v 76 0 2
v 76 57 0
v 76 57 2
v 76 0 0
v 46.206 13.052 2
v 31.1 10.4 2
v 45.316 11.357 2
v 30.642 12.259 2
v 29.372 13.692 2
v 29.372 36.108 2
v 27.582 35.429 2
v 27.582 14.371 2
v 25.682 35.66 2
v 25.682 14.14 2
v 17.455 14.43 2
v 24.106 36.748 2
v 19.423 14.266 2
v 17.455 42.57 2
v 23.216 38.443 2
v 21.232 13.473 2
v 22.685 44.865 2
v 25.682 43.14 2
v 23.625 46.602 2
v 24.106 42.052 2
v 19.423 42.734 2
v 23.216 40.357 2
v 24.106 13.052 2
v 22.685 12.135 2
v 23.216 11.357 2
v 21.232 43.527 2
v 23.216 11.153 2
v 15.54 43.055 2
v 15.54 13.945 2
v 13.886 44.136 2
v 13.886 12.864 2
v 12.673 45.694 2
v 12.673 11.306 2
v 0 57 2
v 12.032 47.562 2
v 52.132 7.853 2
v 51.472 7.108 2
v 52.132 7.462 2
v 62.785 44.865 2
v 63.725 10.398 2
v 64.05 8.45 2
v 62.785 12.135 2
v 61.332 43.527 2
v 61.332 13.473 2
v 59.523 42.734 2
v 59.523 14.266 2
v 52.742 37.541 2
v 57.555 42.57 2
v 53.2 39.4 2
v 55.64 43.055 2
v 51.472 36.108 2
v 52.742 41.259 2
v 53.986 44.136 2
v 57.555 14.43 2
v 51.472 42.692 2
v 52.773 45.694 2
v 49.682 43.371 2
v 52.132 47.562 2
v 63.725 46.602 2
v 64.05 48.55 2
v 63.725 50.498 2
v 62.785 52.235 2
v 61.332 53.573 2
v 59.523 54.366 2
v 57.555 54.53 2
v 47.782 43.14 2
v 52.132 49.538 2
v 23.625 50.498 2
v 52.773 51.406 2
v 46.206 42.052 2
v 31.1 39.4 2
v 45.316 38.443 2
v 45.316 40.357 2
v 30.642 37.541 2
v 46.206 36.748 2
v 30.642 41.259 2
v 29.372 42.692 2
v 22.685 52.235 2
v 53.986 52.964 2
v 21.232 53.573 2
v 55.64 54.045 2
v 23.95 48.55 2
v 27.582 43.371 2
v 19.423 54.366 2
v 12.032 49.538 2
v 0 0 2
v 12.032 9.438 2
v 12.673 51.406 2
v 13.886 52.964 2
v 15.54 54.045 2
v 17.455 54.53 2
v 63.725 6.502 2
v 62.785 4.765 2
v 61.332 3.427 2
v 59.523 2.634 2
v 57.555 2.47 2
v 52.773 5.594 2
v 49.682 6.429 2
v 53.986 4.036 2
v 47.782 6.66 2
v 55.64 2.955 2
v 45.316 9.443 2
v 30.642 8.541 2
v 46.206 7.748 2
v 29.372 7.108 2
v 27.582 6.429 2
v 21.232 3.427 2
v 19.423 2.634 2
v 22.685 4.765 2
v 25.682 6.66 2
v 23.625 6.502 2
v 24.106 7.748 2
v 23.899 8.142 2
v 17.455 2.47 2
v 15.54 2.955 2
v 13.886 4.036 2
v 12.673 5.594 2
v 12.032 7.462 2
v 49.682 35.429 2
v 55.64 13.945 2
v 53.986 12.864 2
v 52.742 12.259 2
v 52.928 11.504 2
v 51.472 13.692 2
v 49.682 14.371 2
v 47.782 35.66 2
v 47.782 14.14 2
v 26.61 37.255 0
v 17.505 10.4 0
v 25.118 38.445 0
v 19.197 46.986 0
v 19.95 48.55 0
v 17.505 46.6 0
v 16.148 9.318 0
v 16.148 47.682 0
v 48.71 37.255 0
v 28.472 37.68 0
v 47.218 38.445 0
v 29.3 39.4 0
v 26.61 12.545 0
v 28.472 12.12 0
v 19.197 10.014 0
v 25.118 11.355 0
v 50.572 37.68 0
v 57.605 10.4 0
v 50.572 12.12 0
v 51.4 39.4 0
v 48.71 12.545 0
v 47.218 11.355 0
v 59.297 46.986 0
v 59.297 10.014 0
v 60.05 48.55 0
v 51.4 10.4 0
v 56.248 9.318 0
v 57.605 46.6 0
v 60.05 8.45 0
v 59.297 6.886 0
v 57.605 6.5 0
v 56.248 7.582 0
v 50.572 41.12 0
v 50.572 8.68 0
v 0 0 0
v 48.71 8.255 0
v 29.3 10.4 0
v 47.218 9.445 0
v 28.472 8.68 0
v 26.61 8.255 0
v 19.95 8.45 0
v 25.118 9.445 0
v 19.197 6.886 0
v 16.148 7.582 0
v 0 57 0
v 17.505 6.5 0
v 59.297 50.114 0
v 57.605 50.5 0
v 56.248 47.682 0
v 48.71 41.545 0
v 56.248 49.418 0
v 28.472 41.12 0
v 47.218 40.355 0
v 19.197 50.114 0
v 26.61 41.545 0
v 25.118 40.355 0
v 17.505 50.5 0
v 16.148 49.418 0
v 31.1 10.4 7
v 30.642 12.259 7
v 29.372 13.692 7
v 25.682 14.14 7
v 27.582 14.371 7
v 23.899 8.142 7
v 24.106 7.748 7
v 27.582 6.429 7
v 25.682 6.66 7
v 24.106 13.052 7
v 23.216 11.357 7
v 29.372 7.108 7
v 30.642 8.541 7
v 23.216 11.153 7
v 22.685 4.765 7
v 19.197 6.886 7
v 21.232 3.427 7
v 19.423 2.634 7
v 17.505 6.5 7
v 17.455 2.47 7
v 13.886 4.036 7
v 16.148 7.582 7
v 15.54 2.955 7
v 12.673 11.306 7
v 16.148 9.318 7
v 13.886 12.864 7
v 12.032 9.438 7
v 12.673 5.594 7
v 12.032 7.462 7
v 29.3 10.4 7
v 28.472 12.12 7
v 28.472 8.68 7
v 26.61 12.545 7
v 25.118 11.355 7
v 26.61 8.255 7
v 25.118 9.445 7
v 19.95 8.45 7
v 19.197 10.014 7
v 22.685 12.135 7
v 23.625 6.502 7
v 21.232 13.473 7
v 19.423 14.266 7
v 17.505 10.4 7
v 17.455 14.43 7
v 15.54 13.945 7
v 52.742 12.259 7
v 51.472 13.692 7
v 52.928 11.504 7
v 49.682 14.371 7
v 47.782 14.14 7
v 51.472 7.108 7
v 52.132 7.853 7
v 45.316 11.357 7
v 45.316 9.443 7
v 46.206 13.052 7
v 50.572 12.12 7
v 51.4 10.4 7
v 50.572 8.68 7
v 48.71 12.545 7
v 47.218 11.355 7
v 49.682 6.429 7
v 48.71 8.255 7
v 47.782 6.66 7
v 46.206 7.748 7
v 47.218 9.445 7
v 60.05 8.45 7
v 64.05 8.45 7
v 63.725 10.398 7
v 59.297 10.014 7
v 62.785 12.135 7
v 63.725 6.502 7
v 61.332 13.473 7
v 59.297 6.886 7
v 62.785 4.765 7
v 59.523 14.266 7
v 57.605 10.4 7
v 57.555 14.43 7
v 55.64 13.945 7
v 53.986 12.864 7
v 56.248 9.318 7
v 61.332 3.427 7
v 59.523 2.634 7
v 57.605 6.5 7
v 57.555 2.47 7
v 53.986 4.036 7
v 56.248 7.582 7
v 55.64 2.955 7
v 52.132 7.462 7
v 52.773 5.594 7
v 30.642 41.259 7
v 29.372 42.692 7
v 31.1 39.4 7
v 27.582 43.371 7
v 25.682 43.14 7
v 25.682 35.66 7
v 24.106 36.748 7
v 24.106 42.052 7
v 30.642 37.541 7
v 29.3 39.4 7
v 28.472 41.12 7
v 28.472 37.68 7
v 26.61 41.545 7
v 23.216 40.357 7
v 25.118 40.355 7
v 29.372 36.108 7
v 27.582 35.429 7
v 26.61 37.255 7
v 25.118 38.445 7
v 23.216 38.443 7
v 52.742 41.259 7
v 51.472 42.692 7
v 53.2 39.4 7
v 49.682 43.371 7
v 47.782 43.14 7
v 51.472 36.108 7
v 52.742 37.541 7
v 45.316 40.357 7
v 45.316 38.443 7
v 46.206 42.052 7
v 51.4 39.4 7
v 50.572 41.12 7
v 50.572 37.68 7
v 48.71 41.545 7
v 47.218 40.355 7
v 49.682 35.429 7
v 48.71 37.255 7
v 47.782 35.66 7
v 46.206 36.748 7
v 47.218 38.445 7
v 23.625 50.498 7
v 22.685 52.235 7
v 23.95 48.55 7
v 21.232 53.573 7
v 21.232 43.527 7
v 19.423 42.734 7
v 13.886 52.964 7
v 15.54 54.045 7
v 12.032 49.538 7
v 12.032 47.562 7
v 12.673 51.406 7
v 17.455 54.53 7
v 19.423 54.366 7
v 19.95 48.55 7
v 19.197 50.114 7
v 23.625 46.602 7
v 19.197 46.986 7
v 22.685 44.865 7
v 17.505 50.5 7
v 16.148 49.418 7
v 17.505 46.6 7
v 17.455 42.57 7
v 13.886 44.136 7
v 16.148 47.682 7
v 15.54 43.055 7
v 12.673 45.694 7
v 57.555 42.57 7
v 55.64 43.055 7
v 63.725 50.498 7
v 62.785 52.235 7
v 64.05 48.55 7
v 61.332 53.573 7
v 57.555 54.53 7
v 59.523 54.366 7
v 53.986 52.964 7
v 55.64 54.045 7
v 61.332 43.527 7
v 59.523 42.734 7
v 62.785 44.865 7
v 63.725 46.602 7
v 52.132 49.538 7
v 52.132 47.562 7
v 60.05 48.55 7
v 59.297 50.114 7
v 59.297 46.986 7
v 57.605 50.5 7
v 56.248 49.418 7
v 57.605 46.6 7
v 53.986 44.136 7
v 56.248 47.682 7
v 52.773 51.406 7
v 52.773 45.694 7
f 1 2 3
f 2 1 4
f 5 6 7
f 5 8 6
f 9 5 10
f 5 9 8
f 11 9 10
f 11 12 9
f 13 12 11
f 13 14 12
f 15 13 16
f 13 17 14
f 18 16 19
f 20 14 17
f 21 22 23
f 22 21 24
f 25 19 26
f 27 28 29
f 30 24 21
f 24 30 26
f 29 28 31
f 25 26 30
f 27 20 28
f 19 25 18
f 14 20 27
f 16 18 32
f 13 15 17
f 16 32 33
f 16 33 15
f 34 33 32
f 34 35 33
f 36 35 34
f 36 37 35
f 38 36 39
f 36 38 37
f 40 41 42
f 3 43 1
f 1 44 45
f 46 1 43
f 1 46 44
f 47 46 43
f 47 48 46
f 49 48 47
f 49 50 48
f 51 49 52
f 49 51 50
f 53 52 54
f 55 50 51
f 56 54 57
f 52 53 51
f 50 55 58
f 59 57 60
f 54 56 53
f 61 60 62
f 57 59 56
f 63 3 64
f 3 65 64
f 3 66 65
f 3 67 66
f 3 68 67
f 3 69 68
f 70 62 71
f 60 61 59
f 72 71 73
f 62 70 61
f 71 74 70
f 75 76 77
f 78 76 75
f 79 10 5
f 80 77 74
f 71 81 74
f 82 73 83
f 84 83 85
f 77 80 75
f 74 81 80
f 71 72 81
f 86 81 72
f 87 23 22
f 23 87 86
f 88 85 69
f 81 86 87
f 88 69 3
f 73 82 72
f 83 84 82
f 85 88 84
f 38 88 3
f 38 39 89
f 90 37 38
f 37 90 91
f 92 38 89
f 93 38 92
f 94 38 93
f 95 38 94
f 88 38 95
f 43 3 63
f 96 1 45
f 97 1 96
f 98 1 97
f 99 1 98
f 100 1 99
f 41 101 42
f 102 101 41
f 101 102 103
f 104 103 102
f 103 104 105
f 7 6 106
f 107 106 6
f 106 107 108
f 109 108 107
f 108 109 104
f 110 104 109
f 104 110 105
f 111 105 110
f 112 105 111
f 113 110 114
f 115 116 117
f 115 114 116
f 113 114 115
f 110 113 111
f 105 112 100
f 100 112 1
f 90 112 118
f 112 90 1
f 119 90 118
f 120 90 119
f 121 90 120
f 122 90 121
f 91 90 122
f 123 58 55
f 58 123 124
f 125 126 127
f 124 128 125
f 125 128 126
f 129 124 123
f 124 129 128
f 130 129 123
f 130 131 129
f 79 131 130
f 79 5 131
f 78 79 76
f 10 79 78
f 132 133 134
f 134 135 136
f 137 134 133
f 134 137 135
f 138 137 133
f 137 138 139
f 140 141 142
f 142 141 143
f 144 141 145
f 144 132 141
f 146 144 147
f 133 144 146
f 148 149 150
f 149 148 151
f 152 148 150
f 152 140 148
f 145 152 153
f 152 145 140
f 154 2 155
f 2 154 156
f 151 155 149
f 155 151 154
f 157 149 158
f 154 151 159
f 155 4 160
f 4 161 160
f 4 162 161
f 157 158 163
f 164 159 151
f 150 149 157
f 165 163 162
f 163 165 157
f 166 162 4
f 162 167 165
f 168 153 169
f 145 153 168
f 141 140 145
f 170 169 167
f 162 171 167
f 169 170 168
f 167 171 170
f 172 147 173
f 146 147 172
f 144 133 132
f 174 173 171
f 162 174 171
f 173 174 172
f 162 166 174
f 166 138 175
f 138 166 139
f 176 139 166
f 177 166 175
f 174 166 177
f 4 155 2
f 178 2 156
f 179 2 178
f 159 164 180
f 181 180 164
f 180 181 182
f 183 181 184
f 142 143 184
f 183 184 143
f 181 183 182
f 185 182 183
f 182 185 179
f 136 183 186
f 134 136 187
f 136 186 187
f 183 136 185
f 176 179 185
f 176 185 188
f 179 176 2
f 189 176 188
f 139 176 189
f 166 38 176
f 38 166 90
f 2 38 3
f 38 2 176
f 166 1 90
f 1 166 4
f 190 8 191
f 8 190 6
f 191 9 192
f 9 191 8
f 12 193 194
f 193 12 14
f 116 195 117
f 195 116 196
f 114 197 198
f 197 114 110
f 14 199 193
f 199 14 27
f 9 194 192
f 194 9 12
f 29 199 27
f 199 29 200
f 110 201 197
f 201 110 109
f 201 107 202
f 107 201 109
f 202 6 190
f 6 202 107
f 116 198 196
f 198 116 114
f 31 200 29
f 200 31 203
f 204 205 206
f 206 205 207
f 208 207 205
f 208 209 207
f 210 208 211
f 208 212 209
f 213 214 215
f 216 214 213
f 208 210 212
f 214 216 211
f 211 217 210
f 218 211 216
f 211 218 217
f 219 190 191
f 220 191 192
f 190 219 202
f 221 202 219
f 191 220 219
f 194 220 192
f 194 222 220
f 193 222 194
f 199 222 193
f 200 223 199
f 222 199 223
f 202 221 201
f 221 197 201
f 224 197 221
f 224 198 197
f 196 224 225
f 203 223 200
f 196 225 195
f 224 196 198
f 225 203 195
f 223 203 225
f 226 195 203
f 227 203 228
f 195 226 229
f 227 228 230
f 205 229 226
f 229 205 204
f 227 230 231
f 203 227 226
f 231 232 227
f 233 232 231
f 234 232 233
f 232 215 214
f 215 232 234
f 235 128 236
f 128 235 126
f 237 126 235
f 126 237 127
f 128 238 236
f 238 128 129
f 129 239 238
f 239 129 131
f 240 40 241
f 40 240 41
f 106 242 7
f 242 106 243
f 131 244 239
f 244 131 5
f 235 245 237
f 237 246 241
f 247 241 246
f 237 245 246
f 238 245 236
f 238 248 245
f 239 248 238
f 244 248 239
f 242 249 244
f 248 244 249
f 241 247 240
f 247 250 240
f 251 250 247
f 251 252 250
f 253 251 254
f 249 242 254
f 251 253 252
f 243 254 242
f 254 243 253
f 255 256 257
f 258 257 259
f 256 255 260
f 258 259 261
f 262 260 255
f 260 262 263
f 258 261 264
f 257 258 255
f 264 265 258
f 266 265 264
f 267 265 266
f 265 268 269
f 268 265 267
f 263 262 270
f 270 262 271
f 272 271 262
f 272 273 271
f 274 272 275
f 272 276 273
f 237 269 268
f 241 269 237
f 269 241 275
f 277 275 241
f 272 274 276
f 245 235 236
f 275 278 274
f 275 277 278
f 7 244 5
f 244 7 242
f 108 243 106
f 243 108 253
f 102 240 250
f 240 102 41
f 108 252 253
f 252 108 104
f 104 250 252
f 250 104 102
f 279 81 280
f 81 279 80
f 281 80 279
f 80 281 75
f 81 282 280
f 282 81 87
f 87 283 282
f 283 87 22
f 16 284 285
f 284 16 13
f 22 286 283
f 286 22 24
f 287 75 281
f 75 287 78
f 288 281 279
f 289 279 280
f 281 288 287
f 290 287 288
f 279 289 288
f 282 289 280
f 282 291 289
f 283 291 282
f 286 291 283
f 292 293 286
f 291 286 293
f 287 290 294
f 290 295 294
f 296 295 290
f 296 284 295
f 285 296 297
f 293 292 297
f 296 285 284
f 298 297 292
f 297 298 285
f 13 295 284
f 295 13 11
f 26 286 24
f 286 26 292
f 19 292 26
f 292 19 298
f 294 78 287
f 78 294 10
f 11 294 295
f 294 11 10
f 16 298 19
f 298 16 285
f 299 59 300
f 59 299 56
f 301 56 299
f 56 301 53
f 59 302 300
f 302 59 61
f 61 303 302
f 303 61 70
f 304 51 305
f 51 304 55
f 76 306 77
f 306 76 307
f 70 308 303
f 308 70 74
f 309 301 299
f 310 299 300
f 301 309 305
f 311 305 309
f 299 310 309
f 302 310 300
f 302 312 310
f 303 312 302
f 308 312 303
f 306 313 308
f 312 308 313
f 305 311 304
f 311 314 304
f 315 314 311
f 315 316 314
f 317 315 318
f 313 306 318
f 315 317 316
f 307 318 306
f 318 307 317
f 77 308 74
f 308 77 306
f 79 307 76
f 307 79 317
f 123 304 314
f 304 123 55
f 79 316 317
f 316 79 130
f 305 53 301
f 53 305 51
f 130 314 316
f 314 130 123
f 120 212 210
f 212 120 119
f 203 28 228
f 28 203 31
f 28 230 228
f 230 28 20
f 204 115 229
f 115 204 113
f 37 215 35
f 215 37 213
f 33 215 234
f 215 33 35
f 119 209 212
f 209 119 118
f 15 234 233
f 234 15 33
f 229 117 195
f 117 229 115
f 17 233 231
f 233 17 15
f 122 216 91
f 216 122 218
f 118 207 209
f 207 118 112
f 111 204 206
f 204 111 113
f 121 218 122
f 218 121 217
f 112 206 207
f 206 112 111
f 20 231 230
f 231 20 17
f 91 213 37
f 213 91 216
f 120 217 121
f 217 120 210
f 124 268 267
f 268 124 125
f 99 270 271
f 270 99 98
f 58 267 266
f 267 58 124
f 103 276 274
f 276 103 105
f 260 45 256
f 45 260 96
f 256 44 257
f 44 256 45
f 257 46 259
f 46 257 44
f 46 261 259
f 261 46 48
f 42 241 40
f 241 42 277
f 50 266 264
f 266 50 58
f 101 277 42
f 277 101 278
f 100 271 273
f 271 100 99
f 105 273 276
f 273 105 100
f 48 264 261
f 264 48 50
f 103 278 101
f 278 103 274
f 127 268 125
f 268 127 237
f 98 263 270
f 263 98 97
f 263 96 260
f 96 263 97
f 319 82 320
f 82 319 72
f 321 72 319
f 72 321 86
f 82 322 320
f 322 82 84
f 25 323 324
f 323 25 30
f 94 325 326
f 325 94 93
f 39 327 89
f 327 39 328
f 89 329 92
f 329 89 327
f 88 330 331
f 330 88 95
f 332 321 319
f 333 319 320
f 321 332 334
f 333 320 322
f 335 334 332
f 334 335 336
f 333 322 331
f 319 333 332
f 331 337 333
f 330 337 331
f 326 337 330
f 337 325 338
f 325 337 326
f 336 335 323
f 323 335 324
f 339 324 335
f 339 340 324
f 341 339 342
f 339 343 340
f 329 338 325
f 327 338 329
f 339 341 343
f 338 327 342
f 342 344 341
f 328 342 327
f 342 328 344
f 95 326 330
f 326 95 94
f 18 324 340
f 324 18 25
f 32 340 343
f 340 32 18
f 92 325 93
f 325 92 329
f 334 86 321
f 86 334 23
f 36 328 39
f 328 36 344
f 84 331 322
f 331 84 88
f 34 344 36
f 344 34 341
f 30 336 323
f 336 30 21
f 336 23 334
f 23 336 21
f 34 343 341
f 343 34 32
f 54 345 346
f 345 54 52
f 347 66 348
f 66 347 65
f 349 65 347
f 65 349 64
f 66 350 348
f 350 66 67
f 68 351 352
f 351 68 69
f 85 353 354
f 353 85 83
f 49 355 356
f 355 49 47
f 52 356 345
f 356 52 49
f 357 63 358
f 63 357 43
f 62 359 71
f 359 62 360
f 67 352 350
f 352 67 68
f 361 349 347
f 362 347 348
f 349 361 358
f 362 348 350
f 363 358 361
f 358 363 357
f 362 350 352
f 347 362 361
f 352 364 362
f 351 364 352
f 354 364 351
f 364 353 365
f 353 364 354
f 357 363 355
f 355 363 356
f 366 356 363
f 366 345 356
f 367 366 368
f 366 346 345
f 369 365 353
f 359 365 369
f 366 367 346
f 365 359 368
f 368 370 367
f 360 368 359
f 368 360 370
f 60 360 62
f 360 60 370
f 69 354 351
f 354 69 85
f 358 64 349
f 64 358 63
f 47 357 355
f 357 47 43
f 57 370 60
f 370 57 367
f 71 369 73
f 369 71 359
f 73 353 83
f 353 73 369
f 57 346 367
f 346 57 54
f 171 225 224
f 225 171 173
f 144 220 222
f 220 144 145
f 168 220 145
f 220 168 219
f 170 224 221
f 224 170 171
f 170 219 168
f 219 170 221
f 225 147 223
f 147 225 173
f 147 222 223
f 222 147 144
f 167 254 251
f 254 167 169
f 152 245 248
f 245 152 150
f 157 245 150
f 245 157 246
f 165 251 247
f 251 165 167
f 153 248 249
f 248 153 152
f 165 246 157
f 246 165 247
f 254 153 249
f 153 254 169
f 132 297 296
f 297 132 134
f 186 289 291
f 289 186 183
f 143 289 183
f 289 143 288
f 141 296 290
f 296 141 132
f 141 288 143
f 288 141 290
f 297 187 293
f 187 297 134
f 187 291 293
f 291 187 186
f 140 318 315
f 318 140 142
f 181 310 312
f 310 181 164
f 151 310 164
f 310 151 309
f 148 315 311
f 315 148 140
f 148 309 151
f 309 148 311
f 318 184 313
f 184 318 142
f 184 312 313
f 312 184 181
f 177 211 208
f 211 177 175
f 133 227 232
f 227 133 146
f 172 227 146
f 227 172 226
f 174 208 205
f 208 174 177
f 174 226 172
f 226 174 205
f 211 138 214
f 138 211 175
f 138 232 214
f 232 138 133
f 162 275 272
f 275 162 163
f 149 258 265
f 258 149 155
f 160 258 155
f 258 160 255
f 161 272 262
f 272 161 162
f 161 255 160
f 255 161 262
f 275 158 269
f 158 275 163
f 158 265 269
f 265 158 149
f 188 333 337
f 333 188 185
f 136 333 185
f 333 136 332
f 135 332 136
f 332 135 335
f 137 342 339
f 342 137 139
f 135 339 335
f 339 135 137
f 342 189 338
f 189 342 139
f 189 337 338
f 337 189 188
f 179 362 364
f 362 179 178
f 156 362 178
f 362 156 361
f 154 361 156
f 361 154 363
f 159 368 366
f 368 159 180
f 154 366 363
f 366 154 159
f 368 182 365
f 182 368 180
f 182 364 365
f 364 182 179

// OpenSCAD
// Plate
plateX = 76;
plateY = 57;
plateZThickness = 2;

plateXZero = 38;
plateYZero = 28.5;


//RoboPhilo mount variables
//Screw Hole size is to allow screws to pass through without biting
rpScrewHoleSize = 2.2;

rpXLeft = 26 + rpScrewHoleSize/2;
rpXRight = 48.1 + rpScrewHoleSize/2;
rpXMidSpace = 20;

rpYBottom = 9.3 + rpScrewHoleSize/2;
rpYTop = 38.3 + rpScrewHoleSize/2;
rpYMidSpace = 27;

//ezRobot mount variables
//Screw hole size here is to allow #4 screws to bite into it
//You can change the screwhole size and the hole will stay in the same position
ezrScrewHoleSize = 2;
ezrOffset = 17.5 + 2.55; //2.55 is the center of the hole on teh ezbv4

difference(){
union(){
// Plate
cube([plateX,plateY,plateZThickness]);

//RoboPhilo screw mounts
//fixed position based on the actual plate
//lower left
color([1,0,0])
translate([rpXLeft,rpYBottom,plateZThickness])
cylinder(5,4,4);

//lower right
color([1,0,0])
translate([rpXRight,rpYBottom,plateZThickness])
cylinder(5,4,4);

//upper left
color([1,0,0])
translate([rpXLeft,rpYTop,plateZThickness])
cylinder(5,4,4);

//upper right
color([1,0,0])
translate([rpXRight,rpYTop,plateZThickness])
cylinder(5,4,4);

//EZ Robot Screw mounts
//calculated based on the center coordinates of the plate
//lower left
color([0,1,0])
translate([plateXZero-ezrOffset,plateYZero-ezrOffset,plateZThickness])
cylinder(5,6,6);

//lower right
color([0,1,0])
translate([plateXZero+ezrOffset,plateYZero-ezrOffset,plateZThickness])
cylinder(5,6,6);

//upper left
color([0,1,0])
translate([plateXZero-ezrOffset,plateYZero+ezrOffset,plateZThickness])
cylinder(5,6,6);

//upper right
color([0,1,0])
translate([plateXZero+ezrOffset,plateYZero+ezrOffset,plateZThickness])
cylinder(5,6,6);

} //end union() of plate



//mount holes to mount to RoboPhilo
//lower left
color([0,0,1])
translate([rpXLeft,rpYBottom,-1])
cylinder(10,rpScrewHoleSize,rpScrewHoleSize);

//lower right
color([0,0,1])
translate([rpXRight,rpYBottom,-1])
cylinder(10,rpScrewHoleSize,rpScrewHoleSize);

//upper left
color([0,0,1])
translate([rpXLeft,rpYTop,-1])
cylinder(10,rpScrewHoleSize,rpScrewHoleSize);

//upper right
color([0,0,1])
translate([rpXRight,rpYTop,-1])
cylinder(10,rpScrewHoleSize,rpScrewHoleSize);

//EZ Robot Screw holes
//lower left
color([0,0,1])
translate([plateXZero-ezrOffset,plateYZero-ezrOffset, -1])
cylinder(10,ezrScrewHoleSize,ezrScrewHoleSize);

//lower right
color([0,0,1])
translate([plateXZero+ezrOffset,plateYZero-ezrOffset, -1])
cylinder(10,ezrScrewHoleSize,ezrScrewHoleSize);

//upper left
color([0,0,1])
translate([plateXZero-ezrOffset,plateYZero+ezrOffset, -1])
cylinder(10,ezrScrewHoleSize,ezrScrewHoleSize);

//upper right
color([0,0,1])
translate([plateXZero+ezrOffset,plateYZero+ezrOffset, -1])
cylinder(10,ezrScrewHoleSize,ezrScrewHoleSize);

} // end difference()
